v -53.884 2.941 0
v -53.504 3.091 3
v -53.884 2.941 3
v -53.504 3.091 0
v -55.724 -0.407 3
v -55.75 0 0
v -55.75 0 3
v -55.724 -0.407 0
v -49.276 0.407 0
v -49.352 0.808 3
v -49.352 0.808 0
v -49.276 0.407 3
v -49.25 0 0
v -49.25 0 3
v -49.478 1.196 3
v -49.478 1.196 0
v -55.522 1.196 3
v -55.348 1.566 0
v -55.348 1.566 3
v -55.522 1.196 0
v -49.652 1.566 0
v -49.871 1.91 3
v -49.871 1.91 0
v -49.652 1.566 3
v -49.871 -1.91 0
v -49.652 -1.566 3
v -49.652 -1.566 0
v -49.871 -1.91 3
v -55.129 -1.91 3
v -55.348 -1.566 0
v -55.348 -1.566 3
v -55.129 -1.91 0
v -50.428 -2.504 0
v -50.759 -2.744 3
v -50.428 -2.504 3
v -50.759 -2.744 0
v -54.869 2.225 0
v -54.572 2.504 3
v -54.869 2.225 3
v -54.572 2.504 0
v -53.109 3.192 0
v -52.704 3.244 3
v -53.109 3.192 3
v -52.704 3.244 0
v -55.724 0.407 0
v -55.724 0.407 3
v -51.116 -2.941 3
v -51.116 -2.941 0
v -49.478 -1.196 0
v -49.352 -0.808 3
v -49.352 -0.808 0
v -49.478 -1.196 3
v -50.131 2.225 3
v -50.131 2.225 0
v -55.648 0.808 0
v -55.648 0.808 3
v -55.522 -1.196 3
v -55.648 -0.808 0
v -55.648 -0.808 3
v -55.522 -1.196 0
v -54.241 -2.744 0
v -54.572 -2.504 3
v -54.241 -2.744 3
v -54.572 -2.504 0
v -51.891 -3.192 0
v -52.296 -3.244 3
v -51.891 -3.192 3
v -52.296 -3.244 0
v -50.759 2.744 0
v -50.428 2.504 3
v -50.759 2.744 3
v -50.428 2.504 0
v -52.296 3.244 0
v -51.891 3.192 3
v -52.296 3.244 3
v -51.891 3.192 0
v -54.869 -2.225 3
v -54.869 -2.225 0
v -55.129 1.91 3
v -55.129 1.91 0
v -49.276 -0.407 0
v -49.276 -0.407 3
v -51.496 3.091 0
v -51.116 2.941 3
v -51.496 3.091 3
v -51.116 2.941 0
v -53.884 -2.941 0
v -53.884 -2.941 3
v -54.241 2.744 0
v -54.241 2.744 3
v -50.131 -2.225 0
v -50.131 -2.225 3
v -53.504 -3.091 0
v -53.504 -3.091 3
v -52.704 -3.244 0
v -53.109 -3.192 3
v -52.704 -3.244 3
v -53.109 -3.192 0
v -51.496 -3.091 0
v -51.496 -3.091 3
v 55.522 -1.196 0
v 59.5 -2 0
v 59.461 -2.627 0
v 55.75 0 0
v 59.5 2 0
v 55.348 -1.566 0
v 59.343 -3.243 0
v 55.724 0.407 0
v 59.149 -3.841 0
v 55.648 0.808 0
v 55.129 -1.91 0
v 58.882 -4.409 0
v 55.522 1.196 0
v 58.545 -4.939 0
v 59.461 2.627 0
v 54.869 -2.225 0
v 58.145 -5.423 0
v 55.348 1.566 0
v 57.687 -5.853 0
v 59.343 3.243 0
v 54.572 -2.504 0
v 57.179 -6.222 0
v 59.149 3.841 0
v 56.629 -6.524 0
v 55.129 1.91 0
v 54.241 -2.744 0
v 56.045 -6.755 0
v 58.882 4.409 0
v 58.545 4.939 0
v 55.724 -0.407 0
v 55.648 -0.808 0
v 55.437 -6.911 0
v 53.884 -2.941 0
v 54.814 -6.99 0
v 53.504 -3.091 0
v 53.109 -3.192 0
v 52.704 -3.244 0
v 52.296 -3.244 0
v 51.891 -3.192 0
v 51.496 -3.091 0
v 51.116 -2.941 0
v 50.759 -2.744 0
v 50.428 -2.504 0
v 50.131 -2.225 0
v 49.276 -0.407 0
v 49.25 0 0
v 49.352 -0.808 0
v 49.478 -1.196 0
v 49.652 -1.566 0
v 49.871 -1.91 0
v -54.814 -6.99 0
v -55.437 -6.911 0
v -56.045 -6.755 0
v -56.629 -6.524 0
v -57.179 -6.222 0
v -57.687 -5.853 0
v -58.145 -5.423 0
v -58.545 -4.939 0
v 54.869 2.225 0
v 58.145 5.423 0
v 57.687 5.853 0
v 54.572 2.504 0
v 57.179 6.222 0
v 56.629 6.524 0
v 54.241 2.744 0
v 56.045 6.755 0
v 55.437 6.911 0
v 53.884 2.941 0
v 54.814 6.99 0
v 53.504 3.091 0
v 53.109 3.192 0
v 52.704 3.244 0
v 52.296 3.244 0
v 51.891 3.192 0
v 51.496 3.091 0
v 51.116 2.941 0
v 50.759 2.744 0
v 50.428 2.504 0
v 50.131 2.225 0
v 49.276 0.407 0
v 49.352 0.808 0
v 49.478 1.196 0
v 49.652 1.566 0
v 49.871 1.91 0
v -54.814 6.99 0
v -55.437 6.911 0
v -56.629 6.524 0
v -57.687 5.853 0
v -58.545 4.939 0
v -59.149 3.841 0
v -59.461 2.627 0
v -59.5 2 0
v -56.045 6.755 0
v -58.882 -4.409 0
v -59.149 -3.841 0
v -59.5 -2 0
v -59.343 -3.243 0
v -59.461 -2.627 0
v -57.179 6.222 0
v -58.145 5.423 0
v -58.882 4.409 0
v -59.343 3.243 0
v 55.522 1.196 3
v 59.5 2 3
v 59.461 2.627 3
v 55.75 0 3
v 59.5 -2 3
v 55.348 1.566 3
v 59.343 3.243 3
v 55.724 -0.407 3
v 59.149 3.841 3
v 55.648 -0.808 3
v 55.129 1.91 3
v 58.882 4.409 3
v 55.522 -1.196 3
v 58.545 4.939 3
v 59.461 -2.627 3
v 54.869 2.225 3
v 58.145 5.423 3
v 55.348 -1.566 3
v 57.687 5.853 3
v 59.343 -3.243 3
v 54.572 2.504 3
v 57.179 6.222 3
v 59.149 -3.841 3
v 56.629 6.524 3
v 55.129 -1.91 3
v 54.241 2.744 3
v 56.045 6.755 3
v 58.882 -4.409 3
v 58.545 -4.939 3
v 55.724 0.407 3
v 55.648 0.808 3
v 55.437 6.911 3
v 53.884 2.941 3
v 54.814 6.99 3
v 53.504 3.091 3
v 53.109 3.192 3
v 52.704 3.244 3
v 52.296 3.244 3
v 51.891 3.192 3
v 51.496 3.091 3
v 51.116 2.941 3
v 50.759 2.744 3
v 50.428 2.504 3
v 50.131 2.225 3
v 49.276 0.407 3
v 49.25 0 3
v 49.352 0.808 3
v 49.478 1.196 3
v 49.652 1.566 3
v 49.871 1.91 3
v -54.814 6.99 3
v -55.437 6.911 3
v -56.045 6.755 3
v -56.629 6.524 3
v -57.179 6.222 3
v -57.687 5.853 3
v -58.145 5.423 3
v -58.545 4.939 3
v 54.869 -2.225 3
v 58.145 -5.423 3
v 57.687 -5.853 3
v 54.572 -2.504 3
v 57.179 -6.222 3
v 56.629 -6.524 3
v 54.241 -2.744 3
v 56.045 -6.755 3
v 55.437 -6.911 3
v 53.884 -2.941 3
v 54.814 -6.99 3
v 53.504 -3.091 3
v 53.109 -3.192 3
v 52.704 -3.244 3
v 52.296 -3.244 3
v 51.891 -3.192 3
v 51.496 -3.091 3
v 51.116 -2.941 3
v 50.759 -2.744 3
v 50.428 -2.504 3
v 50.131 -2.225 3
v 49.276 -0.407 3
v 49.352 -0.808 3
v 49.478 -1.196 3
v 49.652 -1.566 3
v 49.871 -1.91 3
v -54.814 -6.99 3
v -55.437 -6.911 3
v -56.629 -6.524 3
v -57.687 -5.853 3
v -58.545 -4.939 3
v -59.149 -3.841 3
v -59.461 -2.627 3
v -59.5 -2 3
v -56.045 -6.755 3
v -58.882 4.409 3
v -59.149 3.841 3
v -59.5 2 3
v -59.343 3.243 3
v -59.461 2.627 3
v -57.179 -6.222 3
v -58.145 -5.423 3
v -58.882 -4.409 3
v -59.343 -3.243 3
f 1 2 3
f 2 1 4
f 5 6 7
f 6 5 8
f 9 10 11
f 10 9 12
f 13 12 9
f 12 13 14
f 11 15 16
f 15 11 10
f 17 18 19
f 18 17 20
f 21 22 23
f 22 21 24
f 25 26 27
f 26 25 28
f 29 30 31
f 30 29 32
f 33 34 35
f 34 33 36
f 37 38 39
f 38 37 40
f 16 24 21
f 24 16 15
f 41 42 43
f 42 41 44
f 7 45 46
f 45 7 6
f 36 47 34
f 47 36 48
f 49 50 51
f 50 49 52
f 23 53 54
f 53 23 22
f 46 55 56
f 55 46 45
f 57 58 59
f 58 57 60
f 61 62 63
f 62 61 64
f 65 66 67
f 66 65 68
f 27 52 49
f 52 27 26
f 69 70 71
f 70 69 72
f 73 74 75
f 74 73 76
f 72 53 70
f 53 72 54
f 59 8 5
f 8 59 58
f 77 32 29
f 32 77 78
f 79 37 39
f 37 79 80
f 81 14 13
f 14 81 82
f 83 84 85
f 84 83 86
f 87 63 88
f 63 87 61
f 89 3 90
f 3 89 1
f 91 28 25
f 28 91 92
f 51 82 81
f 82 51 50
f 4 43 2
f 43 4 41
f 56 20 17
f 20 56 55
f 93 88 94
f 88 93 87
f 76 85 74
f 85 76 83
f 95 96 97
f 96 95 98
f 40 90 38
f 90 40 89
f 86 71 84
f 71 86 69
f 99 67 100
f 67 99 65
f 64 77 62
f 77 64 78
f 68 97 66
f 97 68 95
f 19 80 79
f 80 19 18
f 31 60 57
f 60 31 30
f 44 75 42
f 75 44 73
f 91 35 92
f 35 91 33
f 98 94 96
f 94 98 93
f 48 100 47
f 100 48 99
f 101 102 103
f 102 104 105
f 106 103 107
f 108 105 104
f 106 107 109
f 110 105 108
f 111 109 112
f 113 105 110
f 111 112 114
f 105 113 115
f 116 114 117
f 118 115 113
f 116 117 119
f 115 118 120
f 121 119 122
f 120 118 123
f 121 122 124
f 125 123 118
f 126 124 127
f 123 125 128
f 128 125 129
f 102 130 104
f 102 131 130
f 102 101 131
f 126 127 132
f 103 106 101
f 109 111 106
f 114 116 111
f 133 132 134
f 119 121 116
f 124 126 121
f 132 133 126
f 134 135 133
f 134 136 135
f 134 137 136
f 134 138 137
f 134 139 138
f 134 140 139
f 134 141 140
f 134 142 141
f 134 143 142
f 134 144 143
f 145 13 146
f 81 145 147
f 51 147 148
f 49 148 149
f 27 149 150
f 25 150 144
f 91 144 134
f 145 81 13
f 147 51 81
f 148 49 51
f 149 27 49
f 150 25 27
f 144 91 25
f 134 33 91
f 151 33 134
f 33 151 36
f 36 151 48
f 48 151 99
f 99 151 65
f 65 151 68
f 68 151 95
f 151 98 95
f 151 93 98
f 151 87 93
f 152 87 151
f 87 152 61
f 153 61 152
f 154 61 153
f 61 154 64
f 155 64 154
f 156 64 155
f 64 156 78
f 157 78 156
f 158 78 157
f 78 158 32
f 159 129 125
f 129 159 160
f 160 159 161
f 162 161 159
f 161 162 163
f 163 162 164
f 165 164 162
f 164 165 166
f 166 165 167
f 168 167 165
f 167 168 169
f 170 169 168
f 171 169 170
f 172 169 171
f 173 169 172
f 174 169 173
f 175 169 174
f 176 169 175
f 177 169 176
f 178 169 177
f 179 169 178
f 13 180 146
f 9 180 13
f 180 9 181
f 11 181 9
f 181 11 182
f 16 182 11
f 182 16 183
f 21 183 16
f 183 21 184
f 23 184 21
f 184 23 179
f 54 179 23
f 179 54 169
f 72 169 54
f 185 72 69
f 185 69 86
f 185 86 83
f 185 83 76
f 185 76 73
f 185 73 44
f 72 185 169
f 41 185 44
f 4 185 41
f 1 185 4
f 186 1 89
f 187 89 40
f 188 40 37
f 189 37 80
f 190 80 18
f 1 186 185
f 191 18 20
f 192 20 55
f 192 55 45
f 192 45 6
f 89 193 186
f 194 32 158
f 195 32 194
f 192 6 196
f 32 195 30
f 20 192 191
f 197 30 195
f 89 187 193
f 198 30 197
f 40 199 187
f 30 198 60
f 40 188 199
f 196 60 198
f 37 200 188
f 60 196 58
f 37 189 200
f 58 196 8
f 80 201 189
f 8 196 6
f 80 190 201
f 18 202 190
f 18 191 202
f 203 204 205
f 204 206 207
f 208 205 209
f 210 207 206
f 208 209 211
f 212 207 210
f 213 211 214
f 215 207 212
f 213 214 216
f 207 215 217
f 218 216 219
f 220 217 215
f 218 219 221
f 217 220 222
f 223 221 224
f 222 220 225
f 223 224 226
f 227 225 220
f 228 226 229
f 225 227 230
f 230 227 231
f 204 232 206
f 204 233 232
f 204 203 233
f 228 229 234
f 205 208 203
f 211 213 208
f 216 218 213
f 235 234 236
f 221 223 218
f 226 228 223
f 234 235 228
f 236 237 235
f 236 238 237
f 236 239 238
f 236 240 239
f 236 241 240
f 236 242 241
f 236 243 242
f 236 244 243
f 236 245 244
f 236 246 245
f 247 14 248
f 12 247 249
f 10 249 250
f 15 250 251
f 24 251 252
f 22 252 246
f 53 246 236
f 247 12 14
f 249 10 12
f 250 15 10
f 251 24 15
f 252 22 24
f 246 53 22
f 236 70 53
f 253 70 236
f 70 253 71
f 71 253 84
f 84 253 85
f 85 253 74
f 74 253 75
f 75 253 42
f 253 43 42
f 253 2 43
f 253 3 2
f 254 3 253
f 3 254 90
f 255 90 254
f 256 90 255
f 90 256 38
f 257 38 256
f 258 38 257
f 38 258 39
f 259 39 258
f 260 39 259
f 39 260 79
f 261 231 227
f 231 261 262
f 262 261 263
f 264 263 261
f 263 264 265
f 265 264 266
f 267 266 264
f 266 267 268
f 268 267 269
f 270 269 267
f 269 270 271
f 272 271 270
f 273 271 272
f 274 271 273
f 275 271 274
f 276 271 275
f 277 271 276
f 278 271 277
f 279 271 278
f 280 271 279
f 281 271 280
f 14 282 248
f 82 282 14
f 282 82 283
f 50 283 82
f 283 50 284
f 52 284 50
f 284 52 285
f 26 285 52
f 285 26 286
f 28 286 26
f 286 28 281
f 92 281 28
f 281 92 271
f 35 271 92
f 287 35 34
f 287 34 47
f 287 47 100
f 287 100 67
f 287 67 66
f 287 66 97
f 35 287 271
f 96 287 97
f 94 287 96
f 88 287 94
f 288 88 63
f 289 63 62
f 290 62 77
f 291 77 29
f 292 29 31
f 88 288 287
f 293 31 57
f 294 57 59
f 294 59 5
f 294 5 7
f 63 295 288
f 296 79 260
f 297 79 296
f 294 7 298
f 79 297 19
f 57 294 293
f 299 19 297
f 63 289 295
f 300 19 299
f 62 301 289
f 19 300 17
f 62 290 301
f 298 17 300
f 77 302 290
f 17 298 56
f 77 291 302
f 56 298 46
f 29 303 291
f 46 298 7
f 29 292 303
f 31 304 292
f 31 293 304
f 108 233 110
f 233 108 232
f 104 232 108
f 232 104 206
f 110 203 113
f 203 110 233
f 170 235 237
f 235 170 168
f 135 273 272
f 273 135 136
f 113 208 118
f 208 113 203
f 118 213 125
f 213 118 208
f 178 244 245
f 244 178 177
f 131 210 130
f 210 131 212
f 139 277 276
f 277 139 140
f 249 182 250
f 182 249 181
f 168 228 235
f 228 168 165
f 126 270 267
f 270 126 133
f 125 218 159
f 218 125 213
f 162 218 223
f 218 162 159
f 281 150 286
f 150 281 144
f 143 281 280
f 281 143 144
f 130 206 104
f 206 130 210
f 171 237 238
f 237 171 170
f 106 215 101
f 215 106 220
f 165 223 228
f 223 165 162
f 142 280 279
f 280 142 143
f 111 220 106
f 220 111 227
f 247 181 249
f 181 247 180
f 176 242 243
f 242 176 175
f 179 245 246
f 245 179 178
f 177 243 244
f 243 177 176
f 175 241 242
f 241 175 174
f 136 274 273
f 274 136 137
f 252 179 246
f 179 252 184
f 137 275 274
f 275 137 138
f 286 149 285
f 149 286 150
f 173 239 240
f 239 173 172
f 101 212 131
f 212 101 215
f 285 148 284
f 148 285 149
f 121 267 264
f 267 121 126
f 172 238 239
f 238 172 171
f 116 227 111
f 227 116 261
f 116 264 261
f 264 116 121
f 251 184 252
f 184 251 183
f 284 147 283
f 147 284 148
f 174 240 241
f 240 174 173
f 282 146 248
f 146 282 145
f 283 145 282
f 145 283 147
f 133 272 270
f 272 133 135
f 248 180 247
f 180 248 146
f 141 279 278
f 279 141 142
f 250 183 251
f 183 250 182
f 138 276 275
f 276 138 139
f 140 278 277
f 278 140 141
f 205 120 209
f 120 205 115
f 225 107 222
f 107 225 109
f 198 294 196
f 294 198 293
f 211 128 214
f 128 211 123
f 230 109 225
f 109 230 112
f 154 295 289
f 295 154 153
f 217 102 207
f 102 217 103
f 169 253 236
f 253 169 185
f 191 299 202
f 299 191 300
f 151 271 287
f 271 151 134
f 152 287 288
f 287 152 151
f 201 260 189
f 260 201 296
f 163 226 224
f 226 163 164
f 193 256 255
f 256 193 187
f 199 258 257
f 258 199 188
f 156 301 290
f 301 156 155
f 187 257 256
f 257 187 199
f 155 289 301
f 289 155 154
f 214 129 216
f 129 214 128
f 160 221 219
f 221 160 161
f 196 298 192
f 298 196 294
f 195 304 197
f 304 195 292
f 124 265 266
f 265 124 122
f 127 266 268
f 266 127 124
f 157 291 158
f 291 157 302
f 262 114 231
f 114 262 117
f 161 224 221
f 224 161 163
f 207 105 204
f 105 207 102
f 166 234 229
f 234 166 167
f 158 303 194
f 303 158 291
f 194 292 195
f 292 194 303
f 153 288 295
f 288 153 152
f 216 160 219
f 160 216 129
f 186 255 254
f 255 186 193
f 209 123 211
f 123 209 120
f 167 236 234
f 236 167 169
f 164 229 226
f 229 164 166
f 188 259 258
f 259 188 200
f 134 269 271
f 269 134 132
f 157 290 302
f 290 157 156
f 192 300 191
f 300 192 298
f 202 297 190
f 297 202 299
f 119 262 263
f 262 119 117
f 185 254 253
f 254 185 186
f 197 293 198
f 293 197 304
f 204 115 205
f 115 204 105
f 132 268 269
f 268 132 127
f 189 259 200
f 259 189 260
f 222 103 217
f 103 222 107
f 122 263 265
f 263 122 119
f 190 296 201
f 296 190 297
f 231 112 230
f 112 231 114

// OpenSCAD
$fn = 50;


difference() {
	union() {
		hull() {
			translate(v = [-54.5000000000, 2.0000000000, 0]) {
				cylinder(h = 3, r = 5);
			}
			translate(v = [54.5000000000, 2.0000000000, 0]) {
				cylinder(h = 3, r = 5);
			}
			translate(v = [-54.5000000000, -2.0000000000, 0]) {
				cylinder(h = 3, r = 5);
			}
			translate(v = [54.5000000000, -2.0000000000, 0]) {
				cylinder(h = 3, r = 5);
			}
		}
	}
	union() {
		translate(v = [-52.5000000000, 0.0000000000, 0]) {
			cylinder(h = 3, r = 3.2500000000);
		}
		translate(v = [52.5000000000, 0.0000000000, 0]) {
			cylinder(h = 3, r = 3.2500000000);
		}
		translate(v = [-52.5000000000, 0.0000000000, 0]) {
			cylinder(h = 3, r = 1.8000000000);
		}
		translate(v = [52.5000000000, 0.0000000000, 0]) {
			cylinder(h = 3, r = 1.8000000000);
		}
		translate(v = [-52.5000000000, 0.0000000000, 0]) {
			cylinder(h = 3, r = 1.8000000000);
		}
		translate(v = [52.5000000000, 0.0000000000, 0]) {
			cylinder(h = 3, r = 1.8000000000);
		}
		translate(v = [-52.5000000000, 0.0000000000, 0]) {
			cylinder(h = 3, r = 1.8000000000);
		}
		translate(v = [52.5000000000, 0.0000000000, 0]) {
			cylinder(h = 3, r = 1.8000000000);
		}
	}
}
